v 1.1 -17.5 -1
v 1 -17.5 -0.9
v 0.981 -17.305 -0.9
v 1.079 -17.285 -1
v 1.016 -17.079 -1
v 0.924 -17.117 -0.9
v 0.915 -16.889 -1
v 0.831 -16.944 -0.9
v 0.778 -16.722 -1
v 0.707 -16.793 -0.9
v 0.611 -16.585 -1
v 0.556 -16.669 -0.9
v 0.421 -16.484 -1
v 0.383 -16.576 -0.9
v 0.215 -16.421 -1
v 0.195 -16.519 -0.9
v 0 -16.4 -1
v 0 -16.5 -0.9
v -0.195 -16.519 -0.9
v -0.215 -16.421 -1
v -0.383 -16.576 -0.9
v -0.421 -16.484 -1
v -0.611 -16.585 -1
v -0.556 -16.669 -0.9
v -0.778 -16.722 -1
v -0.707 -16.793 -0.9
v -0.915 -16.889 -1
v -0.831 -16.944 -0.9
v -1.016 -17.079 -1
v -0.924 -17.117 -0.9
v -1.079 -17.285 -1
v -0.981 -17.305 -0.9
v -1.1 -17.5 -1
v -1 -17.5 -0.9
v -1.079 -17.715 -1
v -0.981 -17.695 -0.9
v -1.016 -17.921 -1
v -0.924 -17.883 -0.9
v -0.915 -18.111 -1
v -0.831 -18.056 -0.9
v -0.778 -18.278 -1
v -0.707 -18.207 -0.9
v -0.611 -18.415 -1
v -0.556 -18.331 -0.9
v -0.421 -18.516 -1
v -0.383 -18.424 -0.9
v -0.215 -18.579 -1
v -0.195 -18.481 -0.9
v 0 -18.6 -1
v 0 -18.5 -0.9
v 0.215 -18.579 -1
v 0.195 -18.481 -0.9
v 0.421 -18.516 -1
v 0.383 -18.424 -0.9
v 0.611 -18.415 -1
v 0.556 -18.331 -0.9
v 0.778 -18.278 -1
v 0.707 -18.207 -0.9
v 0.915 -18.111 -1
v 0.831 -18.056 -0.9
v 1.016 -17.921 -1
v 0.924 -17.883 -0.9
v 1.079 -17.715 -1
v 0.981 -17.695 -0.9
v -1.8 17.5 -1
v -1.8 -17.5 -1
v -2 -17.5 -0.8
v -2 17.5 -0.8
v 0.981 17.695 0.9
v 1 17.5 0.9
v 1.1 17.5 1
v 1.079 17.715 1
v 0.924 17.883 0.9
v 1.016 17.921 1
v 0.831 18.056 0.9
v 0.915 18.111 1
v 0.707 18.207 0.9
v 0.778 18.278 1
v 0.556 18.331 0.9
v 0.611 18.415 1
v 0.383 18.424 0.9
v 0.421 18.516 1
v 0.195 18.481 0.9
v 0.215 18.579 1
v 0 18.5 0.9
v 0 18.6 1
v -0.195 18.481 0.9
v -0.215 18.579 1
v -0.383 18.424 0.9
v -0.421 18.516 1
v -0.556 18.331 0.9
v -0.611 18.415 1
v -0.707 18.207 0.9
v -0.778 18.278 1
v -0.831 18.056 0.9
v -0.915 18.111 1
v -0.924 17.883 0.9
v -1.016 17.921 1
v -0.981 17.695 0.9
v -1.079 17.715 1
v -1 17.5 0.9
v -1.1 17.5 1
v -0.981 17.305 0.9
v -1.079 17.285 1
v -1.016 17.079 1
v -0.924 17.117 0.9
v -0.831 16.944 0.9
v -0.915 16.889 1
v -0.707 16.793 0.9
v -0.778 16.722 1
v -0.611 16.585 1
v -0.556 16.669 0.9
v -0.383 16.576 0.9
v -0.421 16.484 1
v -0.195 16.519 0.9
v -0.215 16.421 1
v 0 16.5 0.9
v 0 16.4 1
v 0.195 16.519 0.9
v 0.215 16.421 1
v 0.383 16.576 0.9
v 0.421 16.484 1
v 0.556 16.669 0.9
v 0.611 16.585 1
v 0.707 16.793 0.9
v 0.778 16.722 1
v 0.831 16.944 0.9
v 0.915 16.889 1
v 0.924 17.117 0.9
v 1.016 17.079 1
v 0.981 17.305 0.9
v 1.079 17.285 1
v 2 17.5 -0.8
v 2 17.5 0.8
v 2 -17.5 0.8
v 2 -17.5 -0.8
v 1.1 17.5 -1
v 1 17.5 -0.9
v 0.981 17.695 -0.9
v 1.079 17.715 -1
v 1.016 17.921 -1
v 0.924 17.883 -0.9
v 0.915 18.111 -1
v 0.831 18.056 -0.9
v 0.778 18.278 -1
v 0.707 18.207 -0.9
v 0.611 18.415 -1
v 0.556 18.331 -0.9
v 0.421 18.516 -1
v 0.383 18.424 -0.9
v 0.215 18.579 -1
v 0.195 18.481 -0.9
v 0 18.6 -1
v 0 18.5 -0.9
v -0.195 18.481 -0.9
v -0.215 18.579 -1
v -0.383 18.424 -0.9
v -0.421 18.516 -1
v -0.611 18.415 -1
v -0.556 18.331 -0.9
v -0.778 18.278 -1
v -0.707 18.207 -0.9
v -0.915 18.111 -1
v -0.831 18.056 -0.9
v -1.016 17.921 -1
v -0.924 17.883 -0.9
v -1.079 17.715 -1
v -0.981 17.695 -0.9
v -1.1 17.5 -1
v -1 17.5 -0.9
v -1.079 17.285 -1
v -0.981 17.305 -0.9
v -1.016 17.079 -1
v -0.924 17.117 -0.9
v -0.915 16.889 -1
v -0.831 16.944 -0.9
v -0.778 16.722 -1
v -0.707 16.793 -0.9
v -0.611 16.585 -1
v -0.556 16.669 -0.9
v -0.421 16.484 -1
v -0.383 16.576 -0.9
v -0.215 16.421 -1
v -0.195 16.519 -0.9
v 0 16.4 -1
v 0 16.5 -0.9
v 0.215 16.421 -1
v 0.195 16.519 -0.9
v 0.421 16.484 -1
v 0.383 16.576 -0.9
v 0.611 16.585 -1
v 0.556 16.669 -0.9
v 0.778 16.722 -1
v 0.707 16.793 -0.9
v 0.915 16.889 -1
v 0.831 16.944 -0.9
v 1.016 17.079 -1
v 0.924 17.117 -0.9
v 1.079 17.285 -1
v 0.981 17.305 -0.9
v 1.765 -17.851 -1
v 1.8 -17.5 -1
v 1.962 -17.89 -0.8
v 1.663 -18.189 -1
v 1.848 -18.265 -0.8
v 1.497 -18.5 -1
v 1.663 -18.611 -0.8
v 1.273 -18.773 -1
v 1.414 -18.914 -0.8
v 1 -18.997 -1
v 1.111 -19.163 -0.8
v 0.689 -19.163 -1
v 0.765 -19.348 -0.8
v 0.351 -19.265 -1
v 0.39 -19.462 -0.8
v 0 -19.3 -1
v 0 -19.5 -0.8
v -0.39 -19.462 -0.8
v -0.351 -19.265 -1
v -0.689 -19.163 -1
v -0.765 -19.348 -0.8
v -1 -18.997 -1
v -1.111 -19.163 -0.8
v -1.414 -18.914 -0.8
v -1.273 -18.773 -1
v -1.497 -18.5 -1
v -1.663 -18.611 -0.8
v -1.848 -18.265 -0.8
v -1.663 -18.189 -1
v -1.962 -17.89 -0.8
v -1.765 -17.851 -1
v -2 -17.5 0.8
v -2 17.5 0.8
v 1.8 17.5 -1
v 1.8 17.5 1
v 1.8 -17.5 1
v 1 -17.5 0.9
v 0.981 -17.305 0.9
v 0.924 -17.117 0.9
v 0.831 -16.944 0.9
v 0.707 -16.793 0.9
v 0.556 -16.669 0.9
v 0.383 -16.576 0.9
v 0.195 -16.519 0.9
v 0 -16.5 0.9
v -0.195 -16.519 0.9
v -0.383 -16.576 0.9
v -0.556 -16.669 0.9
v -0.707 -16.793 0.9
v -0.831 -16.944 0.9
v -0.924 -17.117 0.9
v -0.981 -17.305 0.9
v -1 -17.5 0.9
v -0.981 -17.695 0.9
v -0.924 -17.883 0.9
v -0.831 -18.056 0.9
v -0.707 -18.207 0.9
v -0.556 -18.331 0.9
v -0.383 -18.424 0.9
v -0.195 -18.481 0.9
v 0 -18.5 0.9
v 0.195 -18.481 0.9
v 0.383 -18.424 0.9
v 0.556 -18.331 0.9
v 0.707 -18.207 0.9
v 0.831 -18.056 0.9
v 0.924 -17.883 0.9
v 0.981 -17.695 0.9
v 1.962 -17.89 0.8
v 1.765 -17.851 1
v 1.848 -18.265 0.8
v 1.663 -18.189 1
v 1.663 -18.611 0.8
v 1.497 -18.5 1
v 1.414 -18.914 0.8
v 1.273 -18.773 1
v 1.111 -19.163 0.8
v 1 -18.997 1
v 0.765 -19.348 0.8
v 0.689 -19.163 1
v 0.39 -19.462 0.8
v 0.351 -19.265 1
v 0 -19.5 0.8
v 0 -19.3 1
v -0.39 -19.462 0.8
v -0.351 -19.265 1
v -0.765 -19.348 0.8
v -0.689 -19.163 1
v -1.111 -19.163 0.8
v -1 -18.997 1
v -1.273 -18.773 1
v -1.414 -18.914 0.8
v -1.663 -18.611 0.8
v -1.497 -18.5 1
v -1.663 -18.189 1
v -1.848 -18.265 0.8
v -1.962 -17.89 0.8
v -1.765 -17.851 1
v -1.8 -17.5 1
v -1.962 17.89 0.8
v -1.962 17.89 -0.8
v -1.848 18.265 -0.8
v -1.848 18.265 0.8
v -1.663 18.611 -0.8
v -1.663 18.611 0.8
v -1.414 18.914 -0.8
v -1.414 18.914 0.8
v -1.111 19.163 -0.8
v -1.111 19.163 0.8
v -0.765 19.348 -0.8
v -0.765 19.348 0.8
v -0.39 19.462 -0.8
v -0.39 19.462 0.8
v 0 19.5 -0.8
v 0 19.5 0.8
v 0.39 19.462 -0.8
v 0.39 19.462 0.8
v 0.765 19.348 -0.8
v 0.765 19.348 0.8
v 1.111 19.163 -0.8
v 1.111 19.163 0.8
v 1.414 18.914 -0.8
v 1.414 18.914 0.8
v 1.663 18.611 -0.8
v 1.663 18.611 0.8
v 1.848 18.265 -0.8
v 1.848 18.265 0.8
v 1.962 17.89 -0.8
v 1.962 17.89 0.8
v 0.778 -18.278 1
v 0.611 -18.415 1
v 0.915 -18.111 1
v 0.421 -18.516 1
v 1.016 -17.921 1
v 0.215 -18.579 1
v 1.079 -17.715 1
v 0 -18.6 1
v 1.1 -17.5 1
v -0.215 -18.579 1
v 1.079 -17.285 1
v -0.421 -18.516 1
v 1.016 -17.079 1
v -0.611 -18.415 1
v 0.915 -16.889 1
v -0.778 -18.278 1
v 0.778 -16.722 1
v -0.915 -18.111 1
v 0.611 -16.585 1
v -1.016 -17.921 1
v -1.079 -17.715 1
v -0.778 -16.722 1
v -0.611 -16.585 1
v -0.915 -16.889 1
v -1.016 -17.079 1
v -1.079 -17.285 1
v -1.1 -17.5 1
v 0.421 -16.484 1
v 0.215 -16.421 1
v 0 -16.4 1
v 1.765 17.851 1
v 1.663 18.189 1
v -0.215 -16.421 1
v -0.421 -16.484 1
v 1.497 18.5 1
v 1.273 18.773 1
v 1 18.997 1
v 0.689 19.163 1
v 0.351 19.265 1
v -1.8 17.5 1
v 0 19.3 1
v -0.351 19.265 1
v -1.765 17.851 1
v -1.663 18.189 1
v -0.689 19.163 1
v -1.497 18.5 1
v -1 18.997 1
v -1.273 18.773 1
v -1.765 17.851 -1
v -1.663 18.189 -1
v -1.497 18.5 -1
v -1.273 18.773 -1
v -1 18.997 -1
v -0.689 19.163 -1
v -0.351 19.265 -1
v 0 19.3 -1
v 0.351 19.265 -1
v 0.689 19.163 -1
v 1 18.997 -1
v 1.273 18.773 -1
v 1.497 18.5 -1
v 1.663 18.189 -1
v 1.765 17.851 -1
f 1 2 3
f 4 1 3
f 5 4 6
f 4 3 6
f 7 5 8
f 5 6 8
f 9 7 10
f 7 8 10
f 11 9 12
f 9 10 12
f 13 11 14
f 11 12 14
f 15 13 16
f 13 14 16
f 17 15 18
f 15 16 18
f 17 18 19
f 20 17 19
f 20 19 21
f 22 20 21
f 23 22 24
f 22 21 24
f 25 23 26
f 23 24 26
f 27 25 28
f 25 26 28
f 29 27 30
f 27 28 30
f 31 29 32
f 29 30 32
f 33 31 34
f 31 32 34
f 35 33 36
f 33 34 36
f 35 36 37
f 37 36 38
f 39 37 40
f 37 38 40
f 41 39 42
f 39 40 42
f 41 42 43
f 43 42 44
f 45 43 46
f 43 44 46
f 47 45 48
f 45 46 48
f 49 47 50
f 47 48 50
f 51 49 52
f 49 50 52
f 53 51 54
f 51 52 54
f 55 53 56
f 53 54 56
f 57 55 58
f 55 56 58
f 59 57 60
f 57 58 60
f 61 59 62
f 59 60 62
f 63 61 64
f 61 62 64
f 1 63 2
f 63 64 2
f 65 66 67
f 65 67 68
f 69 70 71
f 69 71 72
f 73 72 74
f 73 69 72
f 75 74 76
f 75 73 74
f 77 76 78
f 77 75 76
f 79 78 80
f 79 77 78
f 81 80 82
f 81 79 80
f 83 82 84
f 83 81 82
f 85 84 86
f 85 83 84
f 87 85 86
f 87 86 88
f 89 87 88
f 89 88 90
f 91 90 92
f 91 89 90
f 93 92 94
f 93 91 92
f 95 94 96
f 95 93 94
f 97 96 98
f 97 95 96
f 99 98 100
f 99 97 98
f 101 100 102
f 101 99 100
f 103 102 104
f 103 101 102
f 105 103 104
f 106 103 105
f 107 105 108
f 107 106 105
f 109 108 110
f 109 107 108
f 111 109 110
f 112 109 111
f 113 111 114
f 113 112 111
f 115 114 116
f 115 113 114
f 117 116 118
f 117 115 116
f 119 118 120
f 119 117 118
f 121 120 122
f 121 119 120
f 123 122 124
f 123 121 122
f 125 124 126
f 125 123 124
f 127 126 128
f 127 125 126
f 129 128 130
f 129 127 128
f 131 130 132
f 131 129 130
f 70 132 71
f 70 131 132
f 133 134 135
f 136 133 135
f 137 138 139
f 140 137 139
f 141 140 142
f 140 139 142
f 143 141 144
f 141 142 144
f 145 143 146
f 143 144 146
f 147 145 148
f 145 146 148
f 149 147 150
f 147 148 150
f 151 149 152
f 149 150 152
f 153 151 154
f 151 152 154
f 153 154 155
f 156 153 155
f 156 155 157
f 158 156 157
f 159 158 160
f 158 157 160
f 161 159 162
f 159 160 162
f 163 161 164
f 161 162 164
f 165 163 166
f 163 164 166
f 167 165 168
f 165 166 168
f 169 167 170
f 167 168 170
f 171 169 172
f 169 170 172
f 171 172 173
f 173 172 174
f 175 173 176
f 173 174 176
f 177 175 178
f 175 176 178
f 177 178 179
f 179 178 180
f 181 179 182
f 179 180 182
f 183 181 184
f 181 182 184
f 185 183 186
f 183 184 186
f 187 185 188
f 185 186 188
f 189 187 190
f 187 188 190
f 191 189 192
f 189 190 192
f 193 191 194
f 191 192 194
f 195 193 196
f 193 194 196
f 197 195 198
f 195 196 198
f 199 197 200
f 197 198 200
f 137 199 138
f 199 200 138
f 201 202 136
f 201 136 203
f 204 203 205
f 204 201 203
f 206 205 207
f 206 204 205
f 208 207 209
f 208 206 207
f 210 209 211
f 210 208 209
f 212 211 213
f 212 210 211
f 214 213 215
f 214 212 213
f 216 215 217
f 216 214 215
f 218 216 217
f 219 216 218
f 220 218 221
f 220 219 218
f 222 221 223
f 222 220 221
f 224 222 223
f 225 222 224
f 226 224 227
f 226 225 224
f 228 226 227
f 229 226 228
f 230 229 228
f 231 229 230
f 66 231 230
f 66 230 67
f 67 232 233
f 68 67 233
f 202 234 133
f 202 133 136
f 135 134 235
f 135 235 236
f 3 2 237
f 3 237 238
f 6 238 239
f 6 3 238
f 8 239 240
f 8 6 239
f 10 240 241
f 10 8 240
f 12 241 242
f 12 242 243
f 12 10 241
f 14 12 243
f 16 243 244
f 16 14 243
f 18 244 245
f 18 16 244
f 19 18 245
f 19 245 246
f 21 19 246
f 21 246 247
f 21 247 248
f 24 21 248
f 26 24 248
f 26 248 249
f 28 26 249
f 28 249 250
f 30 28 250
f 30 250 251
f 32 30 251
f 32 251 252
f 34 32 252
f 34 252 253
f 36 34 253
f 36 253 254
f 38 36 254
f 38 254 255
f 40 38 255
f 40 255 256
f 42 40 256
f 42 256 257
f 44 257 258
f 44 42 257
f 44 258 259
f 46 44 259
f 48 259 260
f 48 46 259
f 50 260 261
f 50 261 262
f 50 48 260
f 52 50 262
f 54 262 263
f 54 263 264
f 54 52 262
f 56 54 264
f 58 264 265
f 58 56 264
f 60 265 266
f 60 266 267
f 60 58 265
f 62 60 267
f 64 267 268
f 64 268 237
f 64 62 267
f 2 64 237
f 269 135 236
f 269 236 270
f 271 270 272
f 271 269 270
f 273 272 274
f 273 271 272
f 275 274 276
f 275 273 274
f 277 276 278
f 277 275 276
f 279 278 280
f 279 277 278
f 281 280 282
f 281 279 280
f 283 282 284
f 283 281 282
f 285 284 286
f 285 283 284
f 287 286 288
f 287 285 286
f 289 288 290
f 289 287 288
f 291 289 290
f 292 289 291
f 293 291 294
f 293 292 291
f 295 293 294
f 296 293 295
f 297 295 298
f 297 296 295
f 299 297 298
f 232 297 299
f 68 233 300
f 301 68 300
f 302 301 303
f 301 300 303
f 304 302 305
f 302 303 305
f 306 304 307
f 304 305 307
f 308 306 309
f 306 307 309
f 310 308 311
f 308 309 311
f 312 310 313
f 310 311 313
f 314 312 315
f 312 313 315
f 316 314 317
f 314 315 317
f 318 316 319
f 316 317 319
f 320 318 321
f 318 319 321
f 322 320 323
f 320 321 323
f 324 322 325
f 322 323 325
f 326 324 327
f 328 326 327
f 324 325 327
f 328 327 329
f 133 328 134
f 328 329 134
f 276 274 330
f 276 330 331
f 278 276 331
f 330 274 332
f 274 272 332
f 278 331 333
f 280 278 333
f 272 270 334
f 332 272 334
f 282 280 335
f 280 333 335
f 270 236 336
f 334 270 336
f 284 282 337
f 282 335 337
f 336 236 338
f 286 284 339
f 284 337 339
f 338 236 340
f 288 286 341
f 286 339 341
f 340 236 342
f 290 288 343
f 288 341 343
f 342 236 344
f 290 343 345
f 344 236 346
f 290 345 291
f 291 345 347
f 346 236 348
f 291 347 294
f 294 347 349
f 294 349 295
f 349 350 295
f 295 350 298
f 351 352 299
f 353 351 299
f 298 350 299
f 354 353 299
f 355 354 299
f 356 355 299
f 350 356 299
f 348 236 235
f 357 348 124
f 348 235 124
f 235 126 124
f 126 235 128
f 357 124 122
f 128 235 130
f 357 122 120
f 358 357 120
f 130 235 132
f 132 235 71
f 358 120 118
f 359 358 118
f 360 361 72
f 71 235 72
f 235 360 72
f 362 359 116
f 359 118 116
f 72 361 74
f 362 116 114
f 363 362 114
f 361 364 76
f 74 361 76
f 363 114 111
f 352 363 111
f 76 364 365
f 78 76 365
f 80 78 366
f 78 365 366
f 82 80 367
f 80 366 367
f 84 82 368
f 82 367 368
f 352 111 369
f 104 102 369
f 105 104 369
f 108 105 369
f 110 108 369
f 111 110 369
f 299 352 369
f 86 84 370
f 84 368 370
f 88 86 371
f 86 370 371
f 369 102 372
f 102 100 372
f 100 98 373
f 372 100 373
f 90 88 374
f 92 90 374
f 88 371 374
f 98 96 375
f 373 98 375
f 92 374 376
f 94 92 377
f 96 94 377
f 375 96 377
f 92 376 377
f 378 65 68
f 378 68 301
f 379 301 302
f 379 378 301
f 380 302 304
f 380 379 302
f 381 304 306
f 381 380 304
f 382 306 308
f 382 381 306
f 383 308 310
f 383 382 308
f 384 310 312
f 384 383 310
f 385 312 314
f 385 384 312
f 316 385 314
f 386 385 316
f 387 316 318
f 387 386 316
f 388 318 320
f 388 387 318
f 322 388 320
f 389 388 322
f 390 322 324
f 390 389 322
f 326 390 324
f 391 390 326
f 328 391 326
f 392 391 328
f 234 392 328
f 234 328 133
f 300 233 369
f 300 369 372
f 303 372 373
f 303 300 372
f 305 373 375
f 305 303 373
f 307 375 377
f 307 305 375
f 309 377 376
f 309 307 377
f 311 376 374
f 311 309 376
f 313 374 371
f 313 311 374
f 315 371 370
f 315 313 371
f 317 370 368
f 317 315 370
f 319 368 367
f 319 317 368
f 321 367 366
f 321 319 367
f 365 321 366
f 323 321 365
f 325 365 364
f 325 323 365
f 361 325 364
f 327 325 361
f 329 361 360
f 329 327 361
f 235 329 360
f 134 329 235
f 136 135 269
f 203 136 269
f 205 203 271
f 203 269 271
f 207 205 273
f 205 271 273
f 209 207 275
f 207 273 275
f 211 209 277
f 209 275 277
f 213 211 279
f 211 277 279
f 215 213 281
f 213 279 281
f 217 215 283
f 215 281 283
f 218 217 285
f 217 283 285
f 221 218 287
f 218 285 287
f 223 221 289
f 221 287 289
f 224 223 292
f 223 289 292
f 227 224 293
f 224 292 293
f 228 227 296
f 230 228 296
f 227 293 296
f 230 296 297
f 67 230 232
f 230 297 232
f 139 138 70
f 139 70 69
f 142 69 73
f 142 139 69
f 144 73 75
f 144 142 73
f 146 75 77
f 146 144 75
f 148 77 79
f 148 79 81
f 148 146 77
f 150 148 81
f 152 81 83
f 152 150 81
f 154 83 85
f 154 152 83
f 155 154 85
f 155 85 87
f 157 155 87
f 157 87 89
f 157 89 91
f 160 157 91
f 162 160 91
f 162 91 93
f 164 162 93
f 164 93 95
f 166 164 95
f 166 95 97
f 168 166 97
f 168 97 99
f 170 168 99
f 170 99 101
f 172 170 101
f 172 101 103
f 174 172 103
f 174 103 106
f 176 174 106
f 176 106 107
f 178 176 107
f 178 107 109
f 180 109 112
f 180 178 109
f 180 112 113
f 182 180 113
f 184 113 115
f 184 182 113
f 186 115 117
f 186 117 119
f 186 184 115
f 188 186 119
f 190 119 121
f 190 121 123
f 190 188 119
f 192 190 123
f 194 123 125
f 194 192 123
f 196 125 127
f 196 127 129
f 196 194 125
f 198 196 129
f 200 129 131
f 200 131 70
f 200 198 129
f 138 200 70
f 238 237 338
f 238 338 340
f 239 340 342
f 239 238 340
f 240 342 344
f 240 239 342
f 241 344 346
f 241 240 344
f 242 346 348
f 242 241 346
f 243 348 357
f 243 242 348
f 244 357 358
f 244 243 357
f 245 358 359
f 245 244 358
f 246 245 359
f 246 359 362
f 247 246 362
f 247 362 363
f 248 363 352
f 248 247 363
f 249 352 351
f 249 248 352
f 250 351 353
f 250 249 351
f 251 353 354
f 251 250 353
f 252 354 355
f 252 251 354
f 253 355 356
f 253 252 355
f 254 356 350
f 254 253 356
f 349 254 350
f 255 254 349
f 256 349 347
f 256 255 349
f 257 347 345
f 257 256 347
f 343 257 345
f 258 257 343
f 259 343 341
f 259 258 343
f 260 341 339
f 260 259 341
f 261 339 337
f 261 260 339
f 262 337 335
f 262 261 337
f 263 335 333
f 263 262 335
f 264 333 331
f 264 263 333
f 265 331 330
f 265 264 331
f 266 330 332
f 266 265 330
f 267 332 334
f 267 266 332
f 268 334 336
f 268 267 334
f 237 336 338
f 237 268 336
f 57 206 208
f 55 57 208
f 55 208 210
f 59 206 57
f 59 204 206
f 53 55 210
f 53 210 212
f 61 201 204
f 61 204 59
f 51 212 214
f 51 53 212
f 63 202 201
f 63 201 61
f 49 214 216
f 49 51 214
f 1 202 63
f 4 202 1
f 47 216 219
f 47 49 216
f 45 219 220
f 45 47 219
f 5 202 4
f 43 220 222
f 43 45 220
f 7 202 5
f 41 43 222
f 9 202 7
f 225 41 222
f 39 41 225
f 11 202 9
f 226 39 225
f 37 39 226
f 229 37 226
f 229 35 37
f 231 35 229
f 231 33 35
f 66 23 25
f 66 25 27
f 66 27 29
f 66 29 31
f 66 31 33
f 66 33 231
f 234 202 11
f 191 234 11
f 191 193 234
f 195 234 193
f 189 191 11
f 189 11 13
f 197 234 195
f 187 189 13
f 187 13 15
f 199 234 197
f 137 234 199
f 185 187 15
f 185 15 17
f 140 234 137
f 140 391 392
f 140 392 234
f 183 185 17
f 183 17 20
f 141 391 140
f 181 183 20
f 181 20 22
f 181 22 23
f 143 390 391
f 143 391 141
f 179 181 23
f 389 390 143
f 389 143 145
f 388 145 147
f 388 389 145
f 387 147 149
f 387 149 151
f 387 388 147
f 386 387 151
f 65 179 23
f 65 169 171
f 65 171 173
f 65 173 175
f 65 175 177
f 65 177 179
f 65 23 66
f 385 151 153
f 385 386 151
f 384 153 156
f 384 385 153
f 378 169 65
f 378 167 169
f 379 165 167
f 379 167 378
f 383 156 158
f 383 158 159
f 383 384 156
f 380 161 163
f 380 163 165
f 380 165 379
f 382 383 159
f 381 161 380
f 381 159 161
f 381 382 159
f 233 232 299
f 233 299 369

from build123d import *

# Parameters (mm, degrees)
SKETCH1_R           = 1
BOSS_EXTRUDE1_DEPTH = 1
CHAMFER1_SIZE       = 0.2
CHAMFER2_SIZE       = 0.1


with BuildPart() as part:
    # Sketch1 → Boss-Extrude1 (new, symmetric)
    with BuildSketch(Plane.XY):
        with BuildLine():
            Line((-2, -17.5), (-2, 17.5))
            ThreePointArc((-2, 17.5), (0, 19.5), (2, 17.5))
            Line((2, 17.5), (2, -17.5))
            ThreePointArc((2, -17.5), (0, -19.5), (-2, -17.5))
        make_face()
        with Locations((0, 17.5)):
            Circle(SKETCH1_R, mode=Mode.SUBTRACT)
        with Locations((0, -17.5)):
            Circle(SKETCH1_R, mode=Mode.SUBTRACT)
    extrude(amount=BOSS_EXTRUDE1_DEPTH, both=True)

    # Chamfer1
    chamfer1_edges = [part.edges().sort_by_distance(p)[0] for p in [
        (0, 19.5, 1),
        (-2, 0, 1),
        (0, -19.5, 1),
        (-2, 0, -1),
        (0, 19.5, -1),
        (2, 0, -1),
        (0, -19.5, -1),
        (2, 0, 1),
    ]]
    chamfer(chamfer1_edges, length=CHAMFER1_SIZE)

    # Chamfer2
    chamfer2_edges = [part.edges().sort_by_distance(p)[0] for p in [
        (-1, 17.5, -1),
        (-1, 17.5, 1),
        (-1, -17.5, -1),
        (-1, -17.5, 1),
    ]]
    chamfer(chamfer2_edges, length=CHAMFER2_SIZE)


solid = part.part
